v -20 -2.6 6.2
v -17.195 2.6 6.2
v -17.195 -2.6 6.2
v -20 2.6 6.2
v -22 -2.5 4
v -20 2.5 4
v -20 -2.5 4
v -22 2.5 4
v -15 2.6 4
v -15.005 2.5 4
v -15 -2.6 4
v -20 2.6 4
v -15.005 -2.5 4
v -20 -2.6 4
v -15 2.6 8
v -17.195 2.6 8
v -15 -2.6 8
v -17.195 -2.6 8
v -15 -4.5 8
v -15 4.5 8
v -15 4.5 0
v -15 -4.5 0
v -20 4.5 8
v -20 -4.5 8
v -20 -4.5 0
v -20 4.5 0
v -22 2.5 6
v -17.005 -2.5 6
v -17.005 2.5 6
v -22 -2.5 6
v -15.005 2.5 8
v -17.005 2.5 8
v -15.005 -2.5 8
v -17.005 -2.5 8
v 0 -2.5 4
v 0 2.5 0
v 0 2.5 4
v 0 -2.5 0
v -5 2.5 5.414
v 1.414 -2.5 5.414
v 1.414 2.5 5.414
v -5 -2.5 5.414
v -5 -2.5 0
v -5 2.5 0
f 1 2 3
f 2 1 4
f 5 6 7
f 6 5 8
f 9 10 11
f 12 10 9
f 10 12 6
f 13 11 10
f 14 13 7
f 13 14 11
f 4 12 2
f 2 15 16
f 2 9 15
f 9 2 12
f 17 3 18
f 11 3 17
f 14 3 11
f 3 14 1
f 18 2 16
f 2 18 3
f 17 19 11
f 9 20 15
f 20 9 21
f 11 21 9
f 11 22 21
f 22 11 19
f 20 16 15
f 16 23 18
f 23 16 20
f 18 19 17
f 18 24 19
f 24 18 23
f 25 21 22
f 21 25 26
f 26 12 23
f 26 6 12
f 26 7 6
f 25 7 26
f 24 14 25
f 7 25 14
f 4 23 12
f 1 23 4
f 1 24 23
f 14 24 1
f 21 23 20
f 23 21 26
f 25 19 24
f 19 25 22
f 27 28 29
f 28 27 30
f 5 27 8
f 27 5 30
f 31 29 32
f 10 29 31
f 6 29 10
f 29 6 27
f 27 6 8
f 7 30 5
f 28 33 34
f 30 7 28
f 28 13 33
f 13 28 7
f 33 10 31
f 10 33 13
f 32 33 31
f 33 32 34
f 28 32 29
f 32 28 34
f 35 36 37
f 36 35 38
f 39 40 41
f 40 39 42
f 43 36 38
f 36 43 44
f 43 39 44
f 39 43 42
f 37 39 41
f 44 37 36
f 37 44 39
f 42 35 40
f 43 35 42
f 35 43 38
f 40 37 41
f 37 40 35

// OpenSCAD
module gubg_slider(w,d,t)
{
    translate([0,-d/2,0])
    union()
    {
        cube([w,d,t]);
        translate([w-0.5*$fs,0,0])
        cube([t,d,2*t]);
    }
}

module gubg_block(w,d,h,t,clearance)
{
    dd = d+2*t;
    hh = h+2*t;
    difference()
    {
        translate([0,-dd/2,0])
        cube([w,dd,hh]);

        translate([-$fs-t-clearance,0,h])
        gubg_slider(w+2*$fs,d+clearance,t+clearance);
    }
}

module gubg_stop(w,d,h,t)
{
    intersection()
    {
        union()
        {
            translate([-w,-d/2,0])
            cube([w,d,h+t/sqrt(2)]);

            translate([0,0,h+t/sqrt(2)])
            rotate(45,[0,1,0])
            cube([t,d,t],true);
        }

        translate([-w,-d/2,0])
        cube([w+t/sqrt(2),d,h+t/sqrt(2)]);
    }
}

$fs = 0.01;

translate([-20,0,0])
{
    gubg_block(5,5,4,2,0.2);

    color([1,0,0])
    translate([-2,0,4])
    gubg_slider(5,5,2);
}

gubg_stop(5,5,4,2);
